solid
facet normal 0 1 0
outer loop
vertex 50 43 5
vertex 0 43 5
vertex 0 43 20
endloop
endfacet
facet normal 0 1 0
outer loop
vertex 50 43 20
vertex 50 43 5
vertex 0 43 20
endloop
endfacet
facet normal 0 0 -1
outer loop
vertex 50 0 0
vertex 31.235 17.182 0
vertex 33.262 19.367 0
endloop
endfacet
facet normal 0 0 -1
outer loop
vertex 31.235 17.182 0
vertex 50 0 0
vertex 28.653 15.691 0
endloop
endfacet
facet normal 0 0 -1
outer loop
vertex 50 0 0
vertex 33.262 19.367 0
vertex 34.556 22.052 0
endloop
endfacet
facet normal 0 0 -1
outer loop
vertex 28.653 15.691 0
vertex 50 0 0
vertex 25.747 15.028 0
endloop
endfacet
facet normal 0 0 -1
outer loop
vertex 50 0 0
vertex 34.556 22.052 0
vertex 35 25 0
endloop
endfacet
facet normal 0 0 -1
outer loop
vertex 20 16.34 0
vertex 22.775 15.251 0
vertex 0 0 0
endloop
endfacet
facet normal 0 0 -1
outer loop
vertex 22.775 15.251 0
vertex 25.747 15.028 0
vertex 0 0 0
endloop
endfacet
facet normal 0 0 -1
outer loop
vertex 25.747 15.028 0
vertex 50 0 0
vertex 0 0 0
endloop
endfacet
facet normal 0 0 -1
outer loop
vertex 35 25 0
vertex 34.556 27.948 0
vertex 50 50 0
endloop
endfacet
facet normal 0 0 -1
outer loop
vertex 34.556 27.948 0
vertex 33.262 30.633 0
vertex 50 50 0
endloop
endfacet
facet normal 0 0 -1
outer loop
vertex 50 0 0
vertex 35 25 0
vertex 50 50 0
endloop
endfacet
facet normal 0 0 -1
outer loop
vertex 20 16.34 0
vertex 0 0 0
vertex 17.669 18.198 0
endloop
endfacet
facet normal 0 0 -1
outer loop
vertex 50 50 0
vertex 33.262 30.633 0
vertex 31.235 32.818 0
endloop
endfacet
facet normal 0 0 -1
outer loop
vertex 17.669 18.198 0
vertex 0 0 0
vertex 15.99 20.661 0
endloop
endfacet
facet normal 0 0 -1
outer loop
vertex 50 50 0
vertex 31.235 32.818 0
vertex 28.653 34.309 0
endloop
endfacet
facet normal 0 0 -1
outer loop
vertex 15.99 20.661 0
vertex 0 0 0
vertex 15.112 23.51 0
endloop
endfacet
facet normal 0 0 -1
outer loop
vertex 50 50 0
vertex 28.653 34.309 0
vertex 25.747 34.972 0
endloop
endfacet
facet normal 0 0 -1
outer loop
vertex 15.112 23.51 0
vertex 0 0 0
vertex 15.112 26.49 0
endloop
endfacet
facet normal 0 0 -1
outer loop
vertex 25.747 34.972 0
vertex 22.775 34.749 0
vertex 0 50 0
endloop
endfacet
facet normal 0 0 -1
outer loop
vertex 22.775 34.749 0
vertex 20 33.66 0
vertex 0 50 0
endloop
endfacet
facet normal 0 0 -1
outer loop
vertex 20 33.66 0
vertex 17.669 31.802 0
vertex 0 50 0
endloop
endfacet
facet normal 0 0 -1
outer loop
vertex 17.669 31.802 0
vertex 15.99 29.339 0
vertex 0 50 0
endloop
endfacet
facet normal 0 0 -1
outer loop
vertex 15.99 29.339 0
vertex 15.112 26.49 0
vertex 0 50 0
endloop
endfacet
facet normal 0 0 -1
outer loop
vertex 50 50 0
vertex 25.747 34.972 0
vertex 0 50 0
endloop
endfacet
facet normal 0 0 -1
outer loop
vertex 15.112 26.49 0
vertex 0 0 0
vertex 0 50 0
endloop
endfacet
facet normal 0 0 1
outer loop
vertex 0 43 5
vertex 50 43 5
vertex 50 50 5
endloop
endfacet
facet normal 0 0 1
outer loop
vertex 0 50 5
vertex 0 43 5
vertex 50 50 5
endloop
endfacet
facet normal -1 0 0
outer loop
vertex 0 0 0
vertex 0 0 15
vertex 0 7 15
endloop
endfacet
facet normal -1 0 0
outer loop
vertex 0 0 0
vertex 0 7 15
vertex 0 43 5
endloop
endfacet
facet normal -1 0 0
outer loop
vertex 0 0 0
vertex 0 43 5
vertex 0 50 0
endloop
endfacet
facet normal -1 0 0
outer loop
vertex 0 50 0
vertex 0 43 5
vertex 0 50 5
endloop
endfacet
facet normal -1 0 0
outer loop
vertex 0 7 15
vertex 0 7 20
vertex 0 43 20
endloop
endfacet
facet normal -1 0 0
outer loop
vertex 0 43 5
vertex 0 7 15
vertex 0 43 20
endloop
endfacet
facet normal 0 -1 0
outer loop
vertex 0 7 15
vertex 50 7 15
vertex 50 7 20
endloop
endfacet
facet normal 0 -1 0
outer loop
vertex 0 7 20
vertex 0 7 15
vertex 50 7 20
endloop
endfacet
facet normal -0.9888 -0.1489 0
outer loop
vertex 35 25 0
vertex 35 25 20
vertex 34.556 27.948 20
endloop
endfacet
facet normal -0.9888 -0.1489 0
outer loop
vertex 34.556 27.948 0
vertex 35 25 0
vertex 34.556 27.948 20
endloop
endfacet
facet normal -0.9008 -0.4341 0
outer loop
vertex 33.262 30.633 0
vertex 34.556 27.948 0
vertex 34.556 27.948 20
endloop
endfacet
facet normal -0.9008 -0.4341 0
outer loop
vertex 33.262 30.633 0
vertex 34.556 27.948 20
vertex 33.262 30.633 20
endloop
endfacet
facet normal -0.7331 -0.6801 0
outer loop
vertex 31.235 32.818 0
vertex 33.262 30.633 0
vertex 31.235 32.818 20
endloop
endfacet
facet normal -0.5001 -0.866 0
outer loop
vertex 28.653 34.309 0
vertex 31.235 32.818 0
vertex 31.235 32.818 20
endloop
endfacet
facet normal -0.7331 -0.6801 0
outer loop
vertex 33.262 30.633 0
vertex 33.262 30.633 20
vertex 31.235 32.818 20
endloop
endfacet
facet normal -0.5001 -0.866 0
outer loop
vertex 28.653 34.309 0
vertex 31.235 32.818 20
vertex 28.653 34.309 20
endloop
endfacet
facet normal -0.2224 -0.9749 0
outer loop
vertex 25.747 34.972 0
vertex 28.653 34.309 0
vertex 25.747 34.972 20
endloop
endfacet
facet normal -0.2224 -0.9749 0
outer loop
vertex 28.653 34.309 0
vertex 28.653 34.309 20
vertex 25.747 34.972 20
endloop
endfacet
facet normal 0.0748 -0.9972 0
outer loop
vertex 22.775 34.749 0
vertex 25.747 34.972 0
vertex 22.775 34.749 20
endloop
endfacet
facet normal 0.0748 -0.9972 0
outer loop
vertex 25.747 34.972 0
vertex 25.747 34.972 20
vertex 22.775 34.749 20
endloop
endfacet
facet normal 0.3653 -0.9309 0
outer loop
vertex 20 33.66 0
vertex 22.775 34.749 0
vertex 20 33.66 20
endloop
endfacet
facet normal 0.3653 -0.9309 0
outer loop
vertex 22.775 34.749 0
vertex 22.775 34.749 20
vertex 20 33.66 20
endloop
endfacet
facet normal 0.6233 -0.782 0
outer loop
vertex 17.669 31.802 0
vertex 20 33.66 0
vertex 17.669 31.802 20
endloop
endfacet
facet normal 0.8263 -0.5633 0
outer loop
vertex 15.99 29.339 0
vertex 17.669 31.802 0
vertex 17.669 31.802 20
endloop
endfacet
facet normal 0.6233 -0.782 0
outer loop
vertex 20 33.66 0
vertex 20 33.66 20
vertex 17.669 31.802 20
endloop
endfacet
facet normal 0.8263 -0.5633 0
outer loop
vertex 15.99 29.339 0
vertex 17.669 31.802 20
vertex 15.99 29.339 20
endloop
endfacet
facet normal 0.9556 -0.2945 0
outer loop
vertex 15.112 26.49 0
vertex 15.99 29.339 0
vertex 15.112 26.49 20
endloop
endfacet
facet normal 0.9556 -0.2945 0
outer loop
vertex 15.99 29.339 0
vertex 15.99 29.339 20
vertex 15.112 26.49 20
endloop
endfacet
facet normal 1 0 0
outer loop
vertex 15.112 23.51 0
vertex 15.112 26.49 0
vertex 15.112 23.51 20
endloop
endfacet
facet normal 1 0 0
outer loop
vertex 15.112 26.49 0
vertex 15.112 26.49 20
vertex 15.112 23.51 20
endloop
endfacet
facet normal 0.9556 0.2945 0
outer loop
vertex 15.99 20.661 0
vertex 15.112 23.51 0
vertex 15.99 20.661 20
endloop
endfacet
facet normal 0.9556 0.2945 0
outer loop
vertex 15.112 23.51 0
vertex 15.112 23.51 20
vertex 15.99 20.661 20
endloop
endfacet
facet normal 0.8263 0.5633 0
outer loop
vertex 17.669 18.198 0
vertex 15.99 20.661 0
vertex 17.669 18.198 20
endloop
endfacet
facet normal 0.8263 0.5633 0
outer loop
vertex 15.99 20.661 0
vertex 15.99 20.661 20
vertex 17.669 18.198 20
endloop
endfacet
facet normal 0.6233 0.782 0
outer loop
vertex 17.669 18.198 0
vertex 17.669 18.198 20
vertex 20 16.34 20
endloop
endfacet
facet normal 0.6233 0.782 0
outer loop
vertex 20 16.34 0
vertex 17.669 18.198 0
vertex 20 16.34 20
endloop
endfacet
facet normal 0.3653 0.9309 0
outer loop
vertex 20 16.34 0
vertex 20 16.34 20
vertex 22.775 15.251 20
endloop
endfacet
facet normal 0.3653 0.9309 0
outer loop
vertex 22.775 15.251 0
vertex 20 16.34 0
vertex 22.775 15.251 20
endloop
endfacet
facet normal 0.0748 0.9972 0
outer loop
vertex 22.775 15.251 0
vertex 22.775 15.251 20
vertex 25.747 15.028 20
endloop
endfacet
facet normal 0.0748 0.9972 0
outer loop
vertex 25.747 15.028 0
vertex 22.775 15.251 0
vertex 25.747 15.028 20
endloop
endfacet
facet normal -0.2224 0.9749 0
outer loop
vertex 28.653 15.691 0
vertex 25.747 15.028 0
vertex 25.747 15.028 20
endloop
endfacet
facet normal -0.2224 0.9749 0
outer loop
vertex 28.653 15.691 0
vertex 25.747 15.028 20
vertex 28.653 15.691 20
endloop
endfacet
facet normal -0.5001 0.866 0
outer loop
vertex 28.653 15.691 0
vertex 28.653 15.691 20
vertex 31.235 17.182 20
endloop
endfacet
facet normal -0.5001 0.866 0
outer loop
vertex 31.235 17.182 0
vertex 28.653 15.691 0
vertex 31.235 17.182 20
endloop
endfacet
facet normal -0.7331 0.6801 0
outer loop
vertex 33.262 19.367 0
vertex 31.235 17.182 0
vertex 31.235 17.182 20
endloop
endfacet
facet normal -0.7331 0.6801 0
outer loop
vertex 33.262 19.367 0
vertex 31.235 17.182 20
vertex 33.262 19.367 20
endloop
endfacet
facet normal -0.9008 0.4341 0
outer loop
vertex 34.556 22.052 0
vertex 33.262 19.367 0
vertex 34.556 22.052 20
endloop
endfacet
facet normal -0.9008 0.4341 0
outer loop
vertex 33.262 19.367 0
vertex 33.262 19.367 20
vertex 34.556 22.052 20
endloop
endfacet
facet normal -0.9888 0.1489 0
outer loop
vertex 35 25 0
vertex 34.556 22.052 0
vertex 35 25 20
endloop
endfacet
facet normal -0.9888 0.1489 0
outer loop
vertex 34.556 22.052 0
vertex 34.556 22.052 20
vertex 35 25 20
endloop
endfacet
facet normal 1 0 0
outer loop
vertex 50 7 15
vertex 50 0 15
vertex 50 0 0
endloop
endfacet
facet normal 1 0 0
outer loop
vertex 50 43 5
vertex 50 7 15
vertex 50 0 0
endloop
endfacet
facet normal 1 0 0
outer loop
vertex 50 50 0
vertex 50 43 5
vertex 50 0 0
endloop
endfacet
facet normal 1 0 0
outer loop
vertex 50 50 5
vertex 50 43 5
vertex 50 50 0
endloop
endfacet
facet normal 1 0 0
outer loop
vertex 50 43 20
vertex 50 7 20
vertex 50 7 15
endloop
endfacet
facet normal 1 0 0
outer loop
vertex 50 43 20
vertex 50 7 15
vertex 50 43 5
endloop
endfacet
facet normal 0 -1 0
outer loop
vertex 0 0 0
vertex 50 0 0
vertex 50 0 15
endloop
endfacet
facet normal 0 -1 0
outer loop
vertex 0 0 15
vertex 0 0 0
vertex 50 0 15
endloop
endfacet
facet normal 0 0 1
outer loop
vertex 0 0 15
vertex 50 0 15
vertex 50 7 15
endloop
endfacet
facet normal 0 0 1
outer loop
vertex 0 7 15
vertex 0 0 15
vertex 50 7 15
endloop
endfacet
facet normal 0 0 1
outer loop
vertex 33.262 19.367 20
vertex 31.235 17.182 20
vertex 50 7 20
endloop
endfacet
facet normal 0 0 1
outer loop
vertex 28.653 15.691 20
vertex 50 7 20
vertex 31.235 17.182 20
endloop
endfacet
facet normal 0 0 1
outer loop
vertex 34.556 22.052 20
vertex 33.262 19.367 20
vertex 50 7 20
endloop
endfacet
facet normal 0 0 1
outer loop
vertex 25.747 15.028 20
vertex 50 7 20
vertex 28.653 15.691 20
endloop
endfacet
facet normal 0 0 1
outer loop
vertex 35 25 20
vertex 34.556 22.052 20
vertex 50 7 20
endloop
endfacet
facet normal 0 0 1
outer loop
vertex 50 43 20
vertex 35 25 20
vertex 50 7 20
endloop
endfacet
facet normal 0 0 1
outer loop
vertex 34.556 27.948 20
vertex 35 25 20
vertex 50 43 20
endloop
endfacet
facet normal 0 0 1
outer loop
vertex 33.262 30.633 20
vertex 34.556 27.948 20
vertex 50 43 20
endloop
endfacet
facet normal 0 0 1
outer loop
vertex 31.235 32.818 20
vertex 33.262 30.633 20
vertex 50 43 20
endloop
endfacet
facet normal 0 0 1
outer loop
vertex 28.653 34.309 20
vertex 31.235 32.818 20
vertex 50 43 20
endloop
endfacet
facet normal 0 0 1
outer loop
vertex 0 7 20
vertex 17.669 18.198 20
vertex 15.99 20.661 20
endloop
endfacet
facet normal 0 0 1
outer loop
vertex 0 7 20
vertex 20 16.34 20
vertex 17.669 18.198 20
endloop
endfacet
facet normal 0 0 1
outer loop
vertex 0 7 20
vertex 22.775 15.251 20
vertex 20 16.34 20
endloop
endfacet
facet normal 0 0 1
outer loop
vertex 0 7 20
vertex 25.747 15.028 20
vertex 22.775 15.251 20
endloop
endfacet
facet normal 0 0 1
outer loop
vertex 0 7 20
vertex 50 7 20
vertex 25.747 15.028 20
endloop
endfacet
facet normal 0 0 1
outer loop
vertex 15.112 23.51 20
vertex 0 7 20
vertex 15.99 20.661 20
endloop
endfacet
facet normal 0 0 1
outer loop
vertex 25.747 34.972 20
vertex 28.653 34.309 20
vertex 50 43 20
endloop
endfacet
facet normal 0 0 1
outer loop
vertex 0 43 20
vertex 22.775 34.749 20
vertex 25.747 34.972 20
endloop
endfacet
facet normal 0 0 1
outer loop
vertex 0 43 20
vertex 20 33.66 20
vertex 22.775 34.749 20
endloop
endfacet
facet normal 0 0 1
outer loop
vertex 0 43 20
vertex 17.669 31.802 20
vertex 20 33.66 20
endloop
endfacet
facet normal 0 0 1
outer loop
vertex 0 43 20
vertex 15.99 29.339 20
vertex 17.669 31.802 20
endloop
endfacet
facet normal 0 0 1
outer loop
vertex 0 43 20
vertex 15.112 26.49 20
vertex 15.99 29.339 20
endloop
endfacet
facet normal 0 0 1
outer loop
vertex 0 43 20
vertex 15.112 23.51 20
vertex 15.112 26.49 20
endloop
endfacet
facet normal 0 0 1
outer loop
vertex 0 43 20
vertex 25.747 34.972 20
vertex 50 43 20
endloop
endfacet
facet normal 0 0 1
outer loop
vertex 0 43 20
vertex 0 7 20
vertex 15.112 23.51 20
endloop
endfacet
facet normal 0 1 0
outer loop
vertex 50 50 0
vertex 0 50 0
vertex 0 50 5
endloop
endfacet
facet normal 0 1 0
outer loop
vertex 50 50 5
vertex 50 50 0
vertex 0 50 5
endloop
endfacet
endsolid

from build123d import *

# Parameters (mm, degrees)
F0_W     = 50
F0_H     = 20
F1_DEPTH = 50
F2_W     = 7
F2_H     = 5
F2_H_2   = 15
F3_DEPTH = 50
F4_R     = 10
F5_DEPTH = 20


with BuildPart() as f1:
    # F0 (on Right) → F1 (new body)
    with BuildSketch(Plane.YZ):
        with Locations((25, 10)):
            Rectangle(F0_W, F0_H)
    extrude(amount=F1_DEPTH)

    # F2 (on face) → F3 (cut)
    with BuildSketch(Plane.YZ.offset(50)):
        with Locations((3.5, 17.5)):
            Rectangle(F2_W, F2_H)
        with Locations((46.5, 12.5)):
            Rectangle(F2_W, F2_H_2)
    extrude(amount=-F3_DEPTH, mode=Mode.SUBTRACT)

    # F4 (on face) → F5 (cut)
    with BuildSketch(Plane.XY.offset(20)):
        with Locations((25, 25)):
            Circle(F4_R)
    extrude(amount=-F5_DEPTH, mode=Mode.SUBTRACT)


solid = f1.part
